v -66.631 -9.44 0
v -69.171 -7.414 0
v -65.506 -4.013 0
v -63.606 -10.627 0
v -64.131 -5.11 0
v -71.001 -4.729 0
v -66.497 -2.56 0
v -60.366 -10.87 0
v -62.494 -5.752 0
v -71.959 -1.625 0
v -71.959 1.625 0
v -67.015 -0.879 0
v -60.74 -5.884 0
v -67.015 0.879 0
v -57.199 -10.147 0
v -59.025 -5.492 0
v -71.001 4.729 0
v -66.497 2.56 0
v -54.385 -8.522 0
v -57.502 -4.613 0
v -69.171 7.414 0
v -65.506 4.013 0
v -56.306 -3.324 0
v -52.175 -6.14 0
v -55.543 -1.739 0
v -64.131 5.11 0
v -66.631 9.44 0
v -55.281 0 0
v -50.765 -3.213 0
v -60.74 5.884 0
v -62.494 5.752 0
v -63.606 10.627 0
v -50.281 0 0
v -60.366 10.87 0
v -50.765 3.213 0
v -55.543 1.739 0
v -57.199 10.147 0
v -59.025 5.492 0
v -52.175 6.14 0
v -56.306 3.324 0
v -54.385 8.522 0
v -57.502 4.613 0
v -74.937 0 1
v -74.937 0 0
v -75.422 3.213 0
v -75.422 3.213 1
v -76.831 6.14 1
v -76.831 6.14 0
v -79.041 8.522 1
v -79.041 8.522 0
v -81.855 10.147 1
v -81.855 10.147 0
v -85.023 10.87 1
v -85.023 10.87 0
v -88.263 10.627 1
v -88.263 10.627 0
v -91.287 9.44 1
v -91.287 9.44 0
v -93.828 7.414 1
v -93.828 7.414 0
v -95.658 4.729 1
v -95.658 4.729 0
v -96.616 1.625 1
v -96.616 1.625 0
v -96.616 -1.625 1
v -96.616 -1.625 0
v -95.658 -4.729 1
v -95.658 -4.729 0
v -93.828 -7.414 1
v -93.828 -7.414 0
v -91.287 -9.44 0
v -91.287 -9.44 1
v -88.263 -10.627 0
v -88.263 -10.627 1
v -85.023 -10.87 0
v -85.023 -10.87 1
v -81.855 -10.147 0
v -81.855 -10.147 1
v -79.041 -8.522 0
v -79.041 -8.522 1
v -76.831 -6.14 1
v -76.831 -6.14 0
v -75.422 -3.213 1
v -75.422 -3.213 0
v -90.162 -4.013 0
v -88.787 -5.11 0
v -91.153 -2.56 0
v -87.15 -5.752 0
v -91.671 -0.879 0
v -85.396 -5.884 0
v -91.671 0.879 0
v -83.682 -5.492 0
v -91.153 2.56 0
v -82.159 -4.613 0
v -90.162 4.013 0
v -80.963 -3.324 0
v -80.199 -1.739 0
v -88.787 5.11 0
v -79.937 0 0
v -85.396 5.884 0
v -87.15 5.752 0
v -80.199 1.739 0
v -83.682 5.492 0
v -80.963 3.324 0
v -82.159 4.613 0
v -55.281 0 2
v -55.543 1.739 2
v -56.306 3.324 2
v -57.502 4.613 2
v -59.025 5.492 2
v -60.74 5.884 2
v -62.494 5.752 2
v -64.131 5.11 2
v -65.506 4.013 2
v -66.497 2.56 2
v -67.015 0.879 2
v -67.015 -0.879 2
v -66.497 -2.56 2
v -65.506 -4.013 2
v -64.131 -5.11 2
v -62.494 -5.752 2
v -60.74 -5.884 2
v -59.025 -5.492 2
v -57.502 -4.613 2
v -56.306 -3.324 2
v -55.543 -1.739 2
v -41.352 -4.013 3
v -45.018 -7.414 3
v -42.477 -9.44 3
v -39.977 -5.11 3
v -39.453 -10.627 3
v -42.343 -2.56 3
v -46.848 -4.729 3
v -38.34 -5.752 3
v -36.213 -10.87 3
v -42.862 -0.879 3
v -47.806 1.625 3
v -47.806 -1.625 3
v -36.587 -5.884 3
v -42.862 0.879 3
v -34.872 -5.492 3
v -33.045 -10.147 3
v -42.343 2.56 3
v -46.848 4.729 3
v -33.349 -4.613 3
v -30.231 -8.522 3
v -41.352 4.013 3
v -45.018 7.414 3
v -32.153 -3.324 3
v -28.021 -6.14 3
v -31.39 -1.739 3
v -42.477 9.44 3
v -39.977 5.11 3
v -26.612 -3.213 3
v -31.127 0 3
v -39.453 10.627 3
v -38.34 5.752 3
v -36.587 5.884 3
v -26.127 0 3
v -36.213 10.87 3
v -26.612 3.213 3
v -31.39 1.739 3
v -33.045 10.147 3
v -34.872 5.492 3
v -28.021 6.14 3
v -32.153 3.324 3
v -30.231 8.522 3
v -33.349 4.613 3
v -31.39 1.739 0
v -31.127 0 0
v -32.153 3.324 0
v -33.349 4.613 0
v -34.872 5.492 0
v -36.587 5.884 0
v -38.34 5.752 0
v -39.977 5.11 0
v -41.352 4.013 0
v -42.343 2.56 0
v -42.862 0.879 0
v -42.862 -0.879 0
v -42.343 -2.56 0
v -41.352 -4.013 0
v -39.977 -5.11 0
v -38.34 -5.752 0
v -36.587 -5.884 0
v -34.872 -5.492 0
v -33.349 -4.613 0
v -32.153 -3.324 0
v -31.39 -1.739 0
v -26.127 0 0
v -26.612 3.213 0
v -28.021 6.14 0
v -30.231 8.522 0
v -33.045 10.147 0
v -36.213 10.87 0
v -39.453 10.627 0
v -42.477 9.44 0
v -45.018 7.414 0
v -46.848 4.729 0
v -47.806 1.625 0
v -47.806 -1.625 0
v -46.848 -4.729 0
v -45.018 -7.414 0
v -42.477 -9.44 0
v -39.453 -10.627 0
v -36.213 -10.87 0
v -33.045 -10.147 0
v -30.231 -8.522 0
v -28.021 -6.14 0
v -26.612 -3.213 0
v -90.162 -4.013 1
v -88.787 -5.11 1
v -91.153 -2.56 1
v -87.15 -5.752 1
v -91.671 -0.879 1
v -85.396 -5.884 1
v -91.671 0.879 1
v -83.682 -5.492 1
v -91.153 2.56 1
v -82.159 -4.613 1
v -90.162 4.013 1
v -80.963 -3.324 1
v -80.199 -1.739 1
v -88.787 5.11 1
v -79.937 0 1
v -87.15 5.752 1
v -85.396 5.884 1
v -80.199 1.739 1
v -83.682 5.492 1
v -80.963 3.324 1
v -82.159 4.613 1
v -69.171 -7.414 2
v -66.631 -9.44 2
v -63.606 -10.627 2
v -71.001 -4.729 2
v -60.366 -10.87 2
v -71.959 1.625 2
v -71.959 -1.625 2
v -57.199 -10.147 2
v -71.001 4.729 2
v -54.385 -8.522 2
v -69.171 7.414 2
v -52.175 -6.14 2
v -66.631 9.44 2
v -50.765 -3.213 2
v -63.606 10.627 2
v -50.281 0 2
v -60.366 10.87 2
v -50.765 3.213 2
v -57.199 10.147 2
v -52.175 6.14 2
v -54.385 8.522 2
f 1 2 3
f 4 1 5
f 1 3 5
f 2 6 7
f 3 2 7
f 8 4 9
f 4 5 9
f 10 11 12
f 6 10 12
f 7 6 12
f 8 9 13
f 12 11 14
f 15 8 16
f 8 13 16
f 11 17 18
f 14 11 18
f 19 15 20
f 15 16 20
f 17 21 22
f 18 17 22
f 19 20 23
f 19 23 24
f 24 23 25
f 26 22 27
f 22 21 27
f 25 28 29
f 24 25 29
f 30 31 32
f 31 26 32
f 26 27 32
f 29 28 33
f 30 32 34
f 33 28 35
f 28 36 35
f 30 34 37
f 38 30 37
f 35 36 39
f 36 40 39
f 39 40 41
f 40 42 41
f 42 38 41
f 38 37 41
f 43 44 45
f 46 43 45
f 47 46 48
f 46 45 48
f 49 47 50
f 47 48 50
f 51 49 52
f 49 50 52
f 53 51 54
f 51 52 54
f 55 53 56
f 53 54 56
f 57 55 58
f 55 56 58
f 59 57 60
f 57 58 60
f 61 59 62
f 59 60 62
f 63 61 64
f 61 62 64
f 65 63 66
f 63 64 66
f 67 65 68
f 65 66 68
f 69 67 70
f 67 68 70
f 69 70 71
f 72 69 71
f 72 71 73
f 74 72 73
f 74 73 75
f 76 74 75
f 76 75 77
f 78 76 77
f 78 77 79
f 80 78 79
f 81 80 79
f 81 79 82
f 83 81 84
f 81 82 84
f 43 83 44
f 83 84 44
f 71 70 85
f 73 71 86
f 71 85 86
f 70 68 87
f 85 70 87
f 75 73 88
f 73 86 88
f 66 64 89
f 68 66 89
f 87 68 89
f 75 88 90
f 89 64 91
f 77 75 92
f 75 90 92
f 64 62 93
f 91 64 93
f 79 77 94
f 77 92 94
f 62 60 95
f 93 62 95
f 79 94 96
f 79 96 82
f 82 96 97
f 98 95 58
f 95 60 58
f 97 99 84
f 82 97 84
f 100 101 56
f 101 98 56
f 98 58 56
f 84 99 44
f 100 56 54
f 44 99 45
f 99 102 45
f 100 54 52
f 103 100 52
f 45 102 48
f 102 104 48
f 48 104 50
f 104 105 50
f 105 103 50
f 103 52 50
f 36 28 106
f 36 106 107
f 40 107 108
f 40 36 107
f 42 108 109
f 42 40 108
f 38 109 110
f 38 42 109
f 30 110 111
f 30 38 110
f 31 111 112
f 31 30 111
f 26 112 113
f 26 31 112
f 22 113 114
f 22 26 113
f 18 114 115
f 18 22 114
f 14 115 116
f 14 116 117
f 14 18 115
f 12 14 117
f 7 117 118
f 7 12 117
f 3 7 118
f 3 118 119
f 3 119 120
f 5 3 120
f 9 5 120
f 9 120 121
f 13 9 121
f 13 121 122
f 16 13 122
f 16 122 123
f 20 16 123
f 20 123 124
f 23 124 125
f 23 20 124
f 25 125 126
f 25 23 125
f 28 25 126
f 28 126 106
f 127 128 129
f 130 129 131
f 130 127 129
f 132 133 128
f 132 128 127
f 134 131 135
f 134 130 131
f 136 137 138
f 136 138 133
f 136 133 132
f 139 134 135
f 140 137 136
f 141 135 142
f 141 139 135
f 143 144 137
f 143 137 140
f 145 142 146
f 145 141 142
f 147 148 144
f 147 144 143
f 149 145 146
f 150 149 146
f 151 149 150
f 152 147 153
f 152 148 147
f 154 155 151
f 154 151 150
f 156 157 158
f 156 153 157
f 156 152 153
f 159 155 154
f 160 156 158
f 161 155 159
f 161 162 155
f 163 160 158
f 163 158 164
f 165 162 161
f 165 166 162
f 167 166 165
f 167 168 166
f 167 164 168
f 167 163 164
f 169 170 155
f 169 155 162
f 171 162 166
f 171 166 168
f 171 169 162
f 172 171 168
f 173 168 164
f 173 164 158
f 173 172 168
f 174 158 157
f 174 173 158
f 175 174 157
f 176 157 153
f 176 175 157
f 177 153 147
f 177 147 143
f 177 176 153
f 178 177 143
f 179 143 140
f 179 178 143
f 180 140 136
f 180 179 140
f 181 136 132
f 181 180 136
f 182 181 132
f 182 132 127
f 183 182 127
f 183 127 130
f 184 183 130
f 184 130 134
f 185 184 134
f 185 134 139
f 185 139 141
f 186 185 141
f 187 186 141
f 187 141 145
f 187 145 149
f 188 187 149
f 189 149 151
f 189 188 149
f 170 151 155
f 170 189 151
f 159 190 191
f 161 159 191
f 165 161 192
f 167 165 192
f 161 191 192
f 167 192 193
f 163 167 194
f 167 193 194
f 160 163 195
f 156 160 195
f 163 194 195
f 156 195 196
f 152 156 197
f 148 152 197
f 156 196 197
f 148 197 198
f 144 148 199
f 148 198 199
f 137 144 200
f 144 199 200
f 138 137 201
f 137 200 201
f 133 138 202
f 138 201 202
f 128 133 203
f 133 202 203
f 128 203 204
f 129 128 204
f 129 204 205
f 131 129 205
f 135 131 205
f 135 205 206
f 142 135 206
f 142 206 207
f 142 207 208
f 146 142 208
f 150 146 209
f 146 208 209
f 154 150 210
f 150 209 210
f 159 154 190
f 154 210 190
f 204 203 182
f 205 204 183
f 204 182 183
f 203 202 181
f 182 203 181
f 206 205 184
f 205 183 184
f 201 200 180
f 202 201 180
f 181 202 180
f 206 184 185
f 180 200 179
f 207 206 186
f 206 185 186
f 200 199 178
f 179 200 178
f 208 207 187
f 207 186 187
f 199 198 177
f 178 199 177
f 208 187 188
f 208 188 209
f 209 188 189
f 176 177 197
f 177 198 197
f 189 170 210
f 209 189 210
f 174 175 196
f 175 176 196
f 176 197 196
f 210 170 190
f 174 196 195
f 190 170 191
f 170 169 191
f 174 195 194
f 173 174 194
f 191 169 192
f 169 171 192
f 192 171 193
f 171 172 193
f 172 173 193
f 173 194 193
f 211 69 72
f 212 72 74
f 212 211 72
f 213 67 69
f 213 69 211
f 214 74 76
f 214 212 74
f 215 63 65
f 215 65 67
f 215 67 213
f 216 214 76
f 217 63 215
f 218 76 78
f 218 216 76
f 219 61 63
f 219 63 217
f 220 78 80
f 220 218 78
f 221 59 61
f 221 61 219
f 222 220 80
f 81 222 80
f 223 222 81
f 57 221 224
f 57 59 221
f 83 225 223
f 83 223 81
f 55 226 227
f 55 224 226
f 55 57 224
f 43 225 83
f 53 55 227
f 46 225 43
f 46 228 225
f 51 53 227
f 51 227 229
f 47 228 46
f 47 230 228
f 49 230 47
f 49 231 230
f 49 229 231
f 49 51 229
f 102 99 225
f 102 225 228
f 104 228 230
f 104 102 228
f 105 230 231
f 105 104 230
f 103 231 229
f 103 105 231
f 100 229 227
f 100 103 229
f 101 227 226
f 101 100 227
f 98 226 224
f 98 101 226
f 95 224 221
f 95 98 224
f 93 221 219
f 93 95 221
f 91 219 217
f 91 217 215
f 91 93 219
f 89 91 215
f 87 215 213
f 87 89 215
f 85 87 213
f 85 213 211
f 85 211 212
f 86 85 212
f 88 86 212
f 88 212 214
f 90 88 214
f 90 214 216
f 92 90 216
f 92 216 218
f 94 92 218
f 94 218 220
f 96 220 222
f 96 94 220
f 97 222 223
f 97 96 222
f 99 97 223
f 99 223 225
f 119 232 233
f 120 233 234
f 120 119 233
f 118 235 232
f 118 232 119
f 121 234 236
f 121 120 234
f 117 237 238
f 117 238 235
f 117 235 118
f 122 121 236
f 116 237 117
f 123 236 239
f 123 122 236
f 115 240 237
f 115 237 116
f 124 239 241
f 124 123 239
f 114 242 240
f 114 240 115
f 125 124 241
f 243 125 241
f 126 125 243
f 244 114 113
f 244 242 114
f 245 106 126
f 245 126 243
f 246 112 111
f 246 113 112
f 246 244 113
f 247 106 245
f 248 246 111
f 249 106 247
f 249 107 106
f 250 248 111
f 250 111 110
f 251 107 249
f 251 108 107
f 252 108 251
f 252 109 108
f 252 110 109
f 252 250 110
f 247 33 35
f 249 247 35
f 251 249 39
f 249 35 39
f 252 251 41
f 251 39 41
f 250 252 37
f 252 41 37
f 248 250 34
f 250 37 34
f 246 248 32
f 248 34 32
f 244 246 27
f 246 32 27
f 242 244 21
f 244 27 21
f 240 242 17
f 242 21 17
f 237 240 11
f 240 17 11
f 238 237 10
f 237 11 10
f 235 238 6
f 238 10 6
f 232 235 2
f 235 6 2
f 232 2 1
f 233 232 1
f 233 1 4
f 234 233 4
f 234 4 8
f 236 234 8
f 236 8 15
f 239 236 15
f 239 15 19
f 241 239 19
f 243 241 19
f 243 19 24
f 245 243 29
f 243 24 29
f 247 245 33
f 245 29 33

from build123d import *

# Parameters (mm, degrees)
F0_R     = 10.9
F0_R_2   = 5.9
F1_DEPTH = 1
F2_DEPTH = 2
F3_DEPTH = 3


with BuildPart() as f1:
    # F0 (on Top) → F1 (new body)
    with BuildSketch(Plane.XY):
        with Locations((-85.837334, 0)):
            Circle(F0_R)
        with Locations((-85.837334, 0)):
            Circle(F0_R_2, mode=Mode.SUBTRACT)
    extrude(amount=F1_DEPTH)


with BuildPart() as f2:
    # F0 (on Top) → F2 (new body)
    with BuildSketch(Plane.XY):
        with Locations((-61.180785, 0)):
            Circle(F0_R)
        with Locations((-61.180785, 0)):
            Circle(F0_R_2, mode=Mode.SUBTRACT)
    extrude(amount=F2_DEPTH)


with BuildPart() as f3:
    # F0 (on Top) → F3 (new body)
    with BuildSketch(Plane.XY):
        with Locations((-37.02743, 0)):
            Circle(F0_R)
        with Locations((-37.02743, 0)):
            Circle(F0_R_2, mode=Mode.SUBTRACT)
    extrude(amount=F3_DEPTH)


solid = Compound([f1.part, f2.part, f3.part])
